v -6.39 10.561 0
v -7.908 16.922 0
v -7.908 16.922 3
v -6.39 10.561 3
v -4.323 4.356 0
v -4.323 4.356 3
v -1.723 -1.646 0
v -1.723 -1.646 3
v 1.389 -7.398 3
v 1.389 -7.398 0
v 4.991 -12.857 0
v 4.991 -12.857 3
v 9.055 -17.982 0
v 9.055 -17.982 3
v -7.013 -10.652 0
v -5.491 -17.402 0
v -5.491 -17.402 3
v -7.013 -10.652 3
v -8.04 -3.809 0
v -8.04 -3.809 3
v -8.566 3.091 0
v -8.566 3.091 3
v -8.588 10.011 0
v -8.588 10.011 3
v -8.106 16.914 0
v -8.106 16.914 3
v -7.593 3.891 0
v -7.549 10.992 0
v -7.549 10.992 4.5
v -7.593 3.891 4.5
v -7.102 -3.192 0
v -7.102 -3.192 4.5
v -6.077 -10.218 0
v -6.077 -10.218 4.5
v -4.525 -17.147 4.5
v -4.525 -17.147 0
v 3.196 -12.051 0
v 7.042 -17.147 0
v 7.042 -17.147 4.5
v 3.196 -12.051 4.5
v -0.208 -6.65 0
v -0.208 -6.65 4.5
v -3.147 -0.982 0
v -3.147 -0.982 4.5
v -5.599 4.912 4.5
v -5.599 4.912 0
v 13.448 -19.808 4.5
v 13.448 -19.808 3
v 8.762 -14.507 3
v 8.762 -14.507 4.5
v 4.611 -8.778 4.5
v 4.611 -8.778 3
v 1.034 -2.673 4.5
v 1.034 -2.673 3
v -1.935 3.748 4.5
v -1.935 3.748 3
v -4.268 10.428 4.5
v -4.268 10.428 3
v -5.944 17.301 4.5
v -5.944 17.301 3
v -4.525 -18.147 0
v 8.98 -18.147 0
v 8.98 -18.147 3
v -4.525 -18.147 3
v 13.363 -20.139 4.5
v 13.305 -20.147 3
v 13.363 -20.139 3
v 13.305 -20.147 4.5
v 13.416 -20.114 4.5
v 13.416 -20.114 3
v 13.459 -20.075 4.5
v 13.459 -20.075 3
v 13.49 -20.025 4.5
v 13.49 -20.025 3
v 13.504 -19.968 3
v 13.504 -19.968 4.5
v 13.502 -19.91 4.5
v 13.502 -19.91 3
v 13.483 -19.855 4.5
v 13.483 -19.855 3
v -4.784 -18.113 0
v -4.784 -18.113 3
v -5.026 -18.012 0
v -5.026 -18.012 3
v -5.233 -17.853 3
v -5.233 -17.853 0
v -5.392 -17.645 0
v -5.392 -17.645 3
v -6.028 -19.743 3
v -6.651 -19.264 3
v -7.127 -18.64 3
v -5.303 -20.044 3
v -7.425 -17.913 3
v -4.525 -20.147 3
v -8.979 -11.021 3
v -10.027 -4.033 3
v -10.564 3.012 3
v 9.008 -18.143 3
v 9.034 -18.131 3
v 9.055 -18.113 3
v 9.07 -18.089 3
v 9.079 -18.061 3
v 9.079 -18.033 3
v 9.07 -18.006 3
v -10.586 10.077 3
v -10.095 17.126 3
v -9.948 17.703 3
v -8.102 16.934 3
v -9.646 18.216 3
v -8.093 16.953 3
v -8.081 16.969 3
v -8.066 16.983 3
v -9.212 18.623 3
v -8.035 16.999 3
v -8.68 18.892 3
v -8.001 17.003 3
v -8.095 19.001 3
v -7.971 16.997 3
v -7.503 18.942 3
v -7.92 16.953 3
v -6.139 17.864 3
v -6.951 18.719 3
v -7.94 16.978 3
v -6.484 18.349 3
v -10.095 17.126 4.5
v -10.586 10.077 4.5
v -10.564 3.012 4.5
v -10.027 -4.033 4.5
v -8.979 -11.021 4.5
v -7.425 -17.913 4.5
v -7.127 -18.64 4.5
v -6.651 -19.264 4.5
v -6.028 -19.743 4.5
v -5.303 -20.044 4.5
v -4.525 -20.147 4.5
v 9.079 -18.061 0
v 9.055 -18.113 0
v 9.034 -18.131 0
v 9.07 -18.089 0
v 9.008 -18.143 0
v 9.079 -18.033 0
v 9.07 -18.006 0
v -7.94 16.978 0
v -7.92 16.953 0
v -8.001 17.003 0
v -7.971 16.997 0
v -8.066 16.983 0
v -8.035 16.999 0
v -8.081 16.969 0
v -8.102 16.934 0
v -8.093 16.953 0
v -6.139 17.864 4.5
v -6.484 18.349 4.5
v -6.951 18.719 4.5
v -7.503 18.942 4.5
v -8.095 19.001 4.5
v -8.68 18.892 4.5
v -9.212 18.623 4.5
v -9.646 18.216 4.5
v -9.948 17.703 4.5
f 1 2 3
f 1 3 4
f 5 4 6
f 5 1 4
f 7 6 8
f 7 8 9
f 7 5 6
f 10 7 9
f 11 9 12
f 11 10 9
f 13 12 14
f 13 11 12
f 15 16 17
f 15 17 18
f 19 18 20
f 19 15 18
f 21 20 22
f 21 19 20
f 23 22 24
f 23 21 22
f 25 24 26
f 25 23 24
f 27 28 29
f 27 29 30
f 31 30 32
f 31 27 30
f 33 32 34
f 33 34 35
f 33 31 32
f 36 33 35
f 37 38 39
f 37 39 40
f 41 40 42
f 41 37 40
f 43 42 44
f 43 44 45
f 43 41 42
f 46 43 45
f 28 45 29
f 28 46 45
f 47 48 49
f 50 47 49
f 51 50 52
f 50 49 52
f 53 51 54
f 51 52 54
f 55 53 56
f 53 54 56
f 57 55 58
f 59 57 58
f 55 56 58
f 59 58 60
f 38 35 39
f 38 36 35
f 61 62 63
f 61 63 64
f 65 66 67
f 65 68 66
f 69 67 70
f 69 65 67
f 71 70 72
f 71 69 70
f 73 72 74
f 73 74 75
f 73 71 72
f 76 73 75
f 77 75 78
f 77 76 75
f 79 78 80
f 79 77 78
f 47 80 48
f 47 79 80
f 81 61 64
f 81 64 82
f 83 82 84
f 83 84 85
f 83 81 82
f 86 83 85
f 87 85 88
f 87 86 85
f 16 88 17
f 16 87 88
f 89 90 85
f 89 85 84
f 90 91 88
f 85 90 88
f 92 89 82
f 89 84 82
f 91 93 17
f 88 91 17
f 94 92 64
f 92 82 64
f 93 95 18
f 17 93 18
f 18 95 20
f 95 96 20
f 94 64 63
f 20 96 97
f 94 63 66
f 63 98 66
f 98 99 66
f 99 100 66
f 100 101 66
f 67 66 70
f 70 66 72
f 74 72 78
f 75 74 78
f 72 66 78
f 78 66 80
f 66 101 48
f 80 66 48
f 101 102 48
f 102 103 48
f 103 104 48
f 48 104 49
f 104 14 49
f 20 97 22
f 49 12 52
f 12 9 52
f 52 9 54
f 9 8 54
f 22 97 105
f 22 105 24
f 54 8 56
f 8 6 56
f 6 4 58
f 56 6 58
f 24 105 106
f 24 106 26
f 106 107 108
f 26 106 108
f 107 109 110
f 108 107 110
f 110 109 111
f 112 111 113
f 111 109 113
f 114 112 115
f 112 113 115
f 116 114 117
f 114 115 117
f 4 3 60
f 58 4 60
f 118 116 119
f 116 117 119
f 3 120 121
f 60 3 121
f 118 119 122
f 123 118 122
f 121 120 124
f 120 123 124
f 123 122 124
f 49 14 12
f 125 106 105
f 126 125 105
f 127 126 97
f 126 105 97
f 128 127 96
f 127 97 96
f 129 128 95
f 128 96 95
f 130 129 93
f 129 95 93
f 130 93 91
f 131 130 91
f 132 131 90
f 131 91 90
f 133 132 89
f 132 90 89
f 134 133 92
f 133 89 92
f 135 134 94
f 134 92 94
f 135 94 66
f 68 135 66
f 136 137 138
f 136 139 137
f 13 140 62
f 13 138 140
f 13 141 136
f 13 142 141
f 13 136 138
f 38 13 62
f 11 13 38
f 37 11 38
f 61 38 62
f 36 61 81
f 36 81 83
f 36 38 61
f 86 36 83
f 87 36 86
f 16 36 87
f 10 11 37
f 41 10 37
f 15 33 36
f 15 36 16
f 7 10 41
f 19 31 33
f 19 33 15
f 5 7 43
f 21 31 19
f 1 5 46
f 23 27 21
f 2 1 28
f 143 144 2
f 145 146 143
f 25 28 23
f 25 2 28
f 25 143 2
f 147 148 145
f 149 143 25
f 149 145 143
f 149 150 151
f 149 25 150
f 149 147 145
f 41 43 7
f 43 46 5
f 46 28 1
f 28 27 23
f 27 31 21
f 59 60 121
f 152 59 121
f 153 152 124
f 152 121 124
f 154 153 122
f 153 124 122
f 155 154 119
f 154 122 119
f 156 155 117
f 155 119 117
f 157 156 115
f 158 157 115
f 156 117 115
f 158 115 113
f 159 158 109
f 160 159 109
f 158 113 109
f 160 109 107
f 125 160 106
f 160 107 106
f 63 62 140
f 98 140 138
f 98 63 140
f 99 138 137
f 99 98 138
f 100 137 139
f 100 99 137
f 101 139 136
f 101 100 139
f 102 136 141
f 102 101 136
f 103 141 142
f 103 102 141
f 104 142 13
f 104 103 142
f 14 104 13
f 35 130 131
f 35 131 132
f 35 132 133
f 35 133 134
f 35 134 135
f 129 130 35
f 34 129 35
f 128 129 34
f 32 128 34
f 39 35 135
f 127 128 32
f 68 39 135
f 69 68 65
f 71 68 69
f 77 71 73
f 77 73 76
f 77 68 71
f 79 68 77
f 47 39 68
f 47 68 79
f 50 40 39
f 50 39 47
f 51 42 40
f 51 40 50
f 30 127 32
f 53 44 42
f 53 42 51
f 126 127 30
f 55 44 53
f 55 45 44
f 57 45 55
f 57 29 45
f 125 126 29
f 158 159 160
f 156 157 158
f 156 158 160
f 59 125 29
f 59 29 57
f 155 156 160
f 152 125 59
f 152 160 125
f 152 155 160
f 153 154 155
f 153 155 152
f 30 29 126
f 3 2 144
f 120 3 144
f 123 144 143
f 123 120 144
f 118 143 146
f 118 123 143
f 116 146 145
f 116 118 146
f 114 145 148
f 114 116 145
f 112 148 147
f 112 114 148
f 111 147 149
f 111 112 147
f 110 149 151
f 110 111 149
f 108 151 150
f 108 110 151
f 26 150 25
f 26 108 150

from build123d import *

# Parameters (mm, degrees)
BOSS_EXTRU_1_DEPTH = 3
CONG_1_R           = 0.1
BOSS_EXTRU_2_DEPTH = 1.5
CONG_2_R           = 0.2
CONG_3_R           = 0.1


with BuildPart() as part:
    # Esquisse1 → Boss.-Extru.1 (new body)
    with BuildSketch(Plane.XY):
        with BuildLine():
            ThreePointArc((-5.491443118, -17.402412154), (-5.134783325, -17.939342697), (-4.524586287, -18.147093005))
            Line((-4.524586287, -18.147093005), (9.198940383, -18.147093005))
            ThreePointArc((9.198940383, -18.147093005), (-1.821522293, -1.442775514), (-8.03233352, 17.581173717))
            ThreePointArc((-8.03233352, 17.581173717), (-8.390456717, -0.028903657), (-5.491443118, -17.402412154))
        make_face()
        with BuildLine():
            Line((7.041670832, -17.147093005), (-4.524586287, -17.147093005))
            ThreePointArc((-4.524586287, -17.147093005), (-7.101772019, -3.192262147), (-7.54889357, 10.99150579))
            ThreePointArc((-7.54889357, 10.99150579), (-1.736845674, -3.846887542), (7.041670832, -17.147093005))
        make_face(mode=Mode.SUBTRACT)
    extrude(amount=BOSS_EXTRU_1_DEPTH)

    # Congé1
    cong_1_edges = [part.edges().sort_by_distance(p)[0] for p in [
        (-8.03233352, 17.581173717, 1.5),
    ]]
    fillet(cong_1_edges, radius=CONG_1_R)

    # Esquisse2 → Boss.-Extru.2 (add)
    with BuildSketch(Plane.XY.offset(3)):
        with BuildLine():
            ThreePointArc((-7.425156781, -17.913050452), (-6.355177402, -19.523842081), (-4.524586287, -20.147093005))
            Line((-4.524586287, -20.147093005), (13.781531415, -20.147093005))
            ThreePointArc((13.781531415, -20.147093005), (1.144889736, -2.883958877), (-5.944425785, 17.301236646))
            ThreePointArc((-5.944425785, 17.301236646), (-8.095151796, 19.001327524), (-10.094549972, 17.125604115))
            ThreePointArc((-10.094549972, 17.125604115), (-10.359767763, -0.515611426), (-7.425156781, -17.913050452))
        make_face()
        with BuildLine():
            ThreePointArc((-7.54889357, 10.99150579), (-1.736845674, -3.846887542), (7.041670832, -17.147093005))
            Line((7.041670832, -17.147093005), (-4.524586287, -17.147093005))
            ThreePointArc((-4.524586287, -17.147093005), (-7.101772019, -3.192262147), (-7.54889357, 10.99150579))
        make_face(mode=Mode.SUBTRACT)
    extrude(amount=BOSS_EXTRU_2_DEPTH)

    # Congé2
    cong_2_edges = [part.edges().sort_by_distance(p)[0] for p in [
        (13.781531415, -20.147093005, 3.75),
    ]]
    fillet(cong_2_edges, radius=CONG_2_R)

    # Congé3
    cong_3_edges = [part.edges().sort_by_distance(p)[0] for p in [
        (9.198940383, -18.147093005, 1.5),
    ]]
    fillet(cong_3_edges, radius=CONG_3_R)


solid = part.part
